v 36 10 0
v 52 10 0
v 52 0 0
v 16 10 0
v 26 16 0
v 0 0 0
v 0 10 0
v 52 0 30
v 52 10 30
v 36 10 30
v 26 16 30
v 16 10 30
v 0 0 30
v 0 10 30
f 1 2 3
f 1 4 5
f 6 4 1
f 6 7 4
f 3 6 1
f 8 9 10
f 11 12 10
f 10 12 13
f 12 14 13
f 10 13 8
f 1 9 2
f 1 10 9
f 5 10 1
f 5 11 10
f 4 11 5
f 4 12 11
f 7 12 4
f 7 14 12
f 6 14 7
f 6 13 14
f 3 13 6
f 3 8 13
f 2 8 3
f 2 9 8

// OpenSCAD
$fn = 32;

// ----------------------------------------------------------------------
// V guide rail: vrib, 52 mm wide
// ----------------------------------------------------------------------

// --- parameters (mm) ---
rail_w = 52;              // rail width, X
base_t = 10;              // base plate thickness
v_depth = 6;              // V feature depth / height
v_half_w = 10;            // half width of the V at the base face
plate_t = 30;             // rail length, Z (the extrusion height)
fit_tol = 0.02;           // declared fit tolerance (prompt contract)
free_tol = 0.2;           // declared free tolerance (prompt contract)

profile = [[0, 0], [52, 0], [52, 10], [36, 10], [26, 16], [16, 10], [0, 10]];  // primary outline, 7 points, counter clockwise

// --- the one profile operation ---
linear_extrude(height = plate_t) polygon(points = profile);
